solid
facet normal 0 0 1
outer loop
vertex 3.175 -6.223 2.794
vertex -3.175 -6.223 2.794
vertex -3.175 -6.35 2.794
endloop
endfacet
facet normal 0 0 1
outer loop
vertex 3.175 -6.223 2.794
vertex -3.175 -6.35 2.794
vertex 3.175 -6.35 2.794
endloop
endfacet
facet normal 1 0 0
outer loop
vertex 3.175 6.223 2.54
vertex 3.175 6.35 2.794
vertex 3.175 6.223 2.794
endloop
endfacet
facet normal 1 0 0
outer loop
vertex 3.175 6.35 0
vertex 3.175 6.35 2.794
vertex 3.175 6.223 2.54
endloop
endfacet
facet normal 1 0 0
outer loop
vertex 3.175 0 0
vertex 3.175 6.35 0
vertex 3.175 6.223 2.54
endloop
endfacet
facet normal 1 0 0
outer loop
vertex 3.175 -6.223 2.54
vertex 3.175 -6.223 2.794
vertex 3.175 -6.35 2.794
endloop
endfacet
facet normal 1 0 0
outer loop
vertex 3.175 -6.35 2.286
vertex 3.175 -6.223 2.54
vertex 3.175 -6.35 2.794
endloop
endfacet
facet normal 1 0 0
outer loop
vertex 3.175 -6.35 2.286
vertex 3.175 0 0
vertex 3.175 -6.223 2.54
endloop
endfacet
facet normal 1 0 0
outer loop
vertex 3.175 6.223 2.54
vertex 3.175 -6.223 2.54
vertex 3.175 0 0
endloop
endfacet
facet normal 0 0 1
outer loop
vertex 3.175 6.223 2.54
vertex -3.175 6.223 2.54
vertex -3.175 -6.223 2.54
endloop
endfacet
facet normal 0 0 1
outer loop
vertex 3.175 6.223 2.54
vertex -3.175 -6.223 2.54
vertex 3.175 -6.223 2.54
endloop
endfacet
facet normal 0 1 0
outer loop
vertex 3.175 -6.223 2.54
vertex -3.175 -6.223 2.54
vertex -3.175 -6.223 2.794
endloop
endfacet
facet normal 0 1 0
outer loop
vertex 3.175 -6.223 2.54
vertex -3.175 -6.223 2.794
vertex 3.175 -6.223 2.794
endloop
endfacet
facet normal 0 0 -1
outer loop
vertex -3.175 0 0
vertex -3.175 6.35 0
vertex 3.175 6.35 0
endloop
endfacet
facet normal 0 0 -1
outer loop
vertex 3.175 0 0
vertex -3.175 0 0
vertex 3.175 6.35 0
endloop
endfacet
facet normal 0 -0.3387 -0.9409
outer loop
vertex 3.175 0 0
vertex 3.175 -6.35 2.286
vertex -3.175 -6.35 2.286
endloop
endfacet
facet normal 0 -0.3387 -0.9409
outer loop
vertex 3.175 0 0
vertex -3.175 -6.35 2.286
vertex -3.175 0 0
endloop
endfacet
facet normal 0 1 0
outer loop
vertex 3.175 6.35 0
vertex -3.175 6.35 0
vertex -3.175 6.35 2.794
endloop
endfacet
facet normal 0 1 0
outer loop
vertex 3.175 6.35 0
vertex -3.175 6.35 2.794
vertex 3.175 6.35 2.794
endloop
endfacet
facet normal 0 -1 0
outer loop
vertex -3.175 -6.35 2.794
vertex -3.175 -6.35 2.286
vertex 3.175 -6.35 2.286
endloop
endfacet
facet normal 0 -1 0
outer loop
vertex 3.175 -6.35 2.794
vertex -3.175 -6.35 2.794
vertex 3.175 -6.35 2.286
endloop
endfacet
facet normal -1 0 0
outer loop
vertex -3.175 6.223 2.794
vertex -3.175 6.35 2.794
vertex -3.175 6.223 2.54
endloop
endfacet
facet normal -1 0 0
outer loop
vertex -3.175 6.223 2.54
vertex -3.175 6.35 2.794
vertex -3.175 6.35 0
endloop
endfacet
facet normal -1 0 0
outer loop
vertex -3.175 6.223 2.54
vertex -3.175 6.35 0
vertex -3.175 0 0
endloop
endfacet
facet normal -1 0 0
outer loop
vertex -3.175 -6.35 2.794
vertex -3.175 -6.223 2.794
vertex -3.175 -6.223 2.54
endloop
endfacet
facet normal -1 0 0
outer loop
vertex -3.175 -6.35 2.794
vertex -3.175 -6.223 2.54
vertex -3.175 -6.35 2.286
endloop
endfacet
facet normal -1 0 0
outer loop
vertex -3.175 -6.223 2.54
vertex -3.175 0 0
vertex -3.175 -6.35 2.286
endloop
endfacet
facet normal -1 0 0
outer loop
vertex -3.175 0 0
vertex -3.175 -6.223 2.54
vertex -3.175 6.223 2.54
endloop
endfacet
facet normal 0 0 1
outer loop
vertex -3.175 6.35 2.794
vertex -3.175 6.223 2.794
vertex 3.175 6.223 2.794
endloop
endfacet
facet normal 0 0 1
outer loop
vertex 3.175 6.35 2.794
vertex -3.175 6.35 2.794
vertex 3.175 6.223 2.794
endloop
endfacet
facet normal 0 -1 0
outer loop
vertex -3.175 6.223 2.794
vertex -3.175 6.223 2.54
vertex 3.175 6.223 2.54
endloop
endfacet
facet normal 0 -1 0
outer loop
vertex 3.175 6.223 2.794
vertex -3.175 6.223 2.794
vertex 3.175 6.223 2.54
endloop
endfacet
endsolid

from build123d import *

# Parameters (mm, degrees)
SKETCH1_W           = 6.35
SKETCH1_H           = 12.7
BOSS_EXTRUDE1_DEPTH = 2.54
SKETCH2_W           = 6.35
SKETCH2_H           = 0.127
BOSS_EXTRUDE2_DEPTH = 0.254
CUT_EXTRUDE1_DEPTH  = 10.404862359


with BuildPart() as part:
    # Sketch1 → Boss-Extrude1 (new body)
    with BuildSketch(Plane.XY):
        Rectangle(SKETCH1_W, SKETCH1_H)
    extrude(amount=BOSS_EXTRUDE1_DEPTH)

    # Sketch2 → Boss-Extrude2 (add)
    with BuildSketch(Plane.XY.offset(2.54)):
        with Locations((0, -6.2865)):
            Rectangle(SKETCH2_W, SKETCH2_H)
    boss_extrude2 = extrude(amount=BOSS_EXTRUDE2_DEPTH)

    # Mirror1: Boss-Extrude2 across plane
    add(boss_extrude2.mirror(Plane.ZX))

    # Sketch3 → Cut-Extrude1 (cut, through all)
    with BuildSketch(Plane(origin=(3.175, 0, 0), x_dir=(0, 0, -1), z_dir=(1, 0, 0))):
        Polygon((0, -6.35), (-2.286, -6.35), (0, 0), align=None)
    extrude(amount=-CUT_EXTRUDE1_DEPTH, mode=Mode.SUBTRACT)


solid = part.part
